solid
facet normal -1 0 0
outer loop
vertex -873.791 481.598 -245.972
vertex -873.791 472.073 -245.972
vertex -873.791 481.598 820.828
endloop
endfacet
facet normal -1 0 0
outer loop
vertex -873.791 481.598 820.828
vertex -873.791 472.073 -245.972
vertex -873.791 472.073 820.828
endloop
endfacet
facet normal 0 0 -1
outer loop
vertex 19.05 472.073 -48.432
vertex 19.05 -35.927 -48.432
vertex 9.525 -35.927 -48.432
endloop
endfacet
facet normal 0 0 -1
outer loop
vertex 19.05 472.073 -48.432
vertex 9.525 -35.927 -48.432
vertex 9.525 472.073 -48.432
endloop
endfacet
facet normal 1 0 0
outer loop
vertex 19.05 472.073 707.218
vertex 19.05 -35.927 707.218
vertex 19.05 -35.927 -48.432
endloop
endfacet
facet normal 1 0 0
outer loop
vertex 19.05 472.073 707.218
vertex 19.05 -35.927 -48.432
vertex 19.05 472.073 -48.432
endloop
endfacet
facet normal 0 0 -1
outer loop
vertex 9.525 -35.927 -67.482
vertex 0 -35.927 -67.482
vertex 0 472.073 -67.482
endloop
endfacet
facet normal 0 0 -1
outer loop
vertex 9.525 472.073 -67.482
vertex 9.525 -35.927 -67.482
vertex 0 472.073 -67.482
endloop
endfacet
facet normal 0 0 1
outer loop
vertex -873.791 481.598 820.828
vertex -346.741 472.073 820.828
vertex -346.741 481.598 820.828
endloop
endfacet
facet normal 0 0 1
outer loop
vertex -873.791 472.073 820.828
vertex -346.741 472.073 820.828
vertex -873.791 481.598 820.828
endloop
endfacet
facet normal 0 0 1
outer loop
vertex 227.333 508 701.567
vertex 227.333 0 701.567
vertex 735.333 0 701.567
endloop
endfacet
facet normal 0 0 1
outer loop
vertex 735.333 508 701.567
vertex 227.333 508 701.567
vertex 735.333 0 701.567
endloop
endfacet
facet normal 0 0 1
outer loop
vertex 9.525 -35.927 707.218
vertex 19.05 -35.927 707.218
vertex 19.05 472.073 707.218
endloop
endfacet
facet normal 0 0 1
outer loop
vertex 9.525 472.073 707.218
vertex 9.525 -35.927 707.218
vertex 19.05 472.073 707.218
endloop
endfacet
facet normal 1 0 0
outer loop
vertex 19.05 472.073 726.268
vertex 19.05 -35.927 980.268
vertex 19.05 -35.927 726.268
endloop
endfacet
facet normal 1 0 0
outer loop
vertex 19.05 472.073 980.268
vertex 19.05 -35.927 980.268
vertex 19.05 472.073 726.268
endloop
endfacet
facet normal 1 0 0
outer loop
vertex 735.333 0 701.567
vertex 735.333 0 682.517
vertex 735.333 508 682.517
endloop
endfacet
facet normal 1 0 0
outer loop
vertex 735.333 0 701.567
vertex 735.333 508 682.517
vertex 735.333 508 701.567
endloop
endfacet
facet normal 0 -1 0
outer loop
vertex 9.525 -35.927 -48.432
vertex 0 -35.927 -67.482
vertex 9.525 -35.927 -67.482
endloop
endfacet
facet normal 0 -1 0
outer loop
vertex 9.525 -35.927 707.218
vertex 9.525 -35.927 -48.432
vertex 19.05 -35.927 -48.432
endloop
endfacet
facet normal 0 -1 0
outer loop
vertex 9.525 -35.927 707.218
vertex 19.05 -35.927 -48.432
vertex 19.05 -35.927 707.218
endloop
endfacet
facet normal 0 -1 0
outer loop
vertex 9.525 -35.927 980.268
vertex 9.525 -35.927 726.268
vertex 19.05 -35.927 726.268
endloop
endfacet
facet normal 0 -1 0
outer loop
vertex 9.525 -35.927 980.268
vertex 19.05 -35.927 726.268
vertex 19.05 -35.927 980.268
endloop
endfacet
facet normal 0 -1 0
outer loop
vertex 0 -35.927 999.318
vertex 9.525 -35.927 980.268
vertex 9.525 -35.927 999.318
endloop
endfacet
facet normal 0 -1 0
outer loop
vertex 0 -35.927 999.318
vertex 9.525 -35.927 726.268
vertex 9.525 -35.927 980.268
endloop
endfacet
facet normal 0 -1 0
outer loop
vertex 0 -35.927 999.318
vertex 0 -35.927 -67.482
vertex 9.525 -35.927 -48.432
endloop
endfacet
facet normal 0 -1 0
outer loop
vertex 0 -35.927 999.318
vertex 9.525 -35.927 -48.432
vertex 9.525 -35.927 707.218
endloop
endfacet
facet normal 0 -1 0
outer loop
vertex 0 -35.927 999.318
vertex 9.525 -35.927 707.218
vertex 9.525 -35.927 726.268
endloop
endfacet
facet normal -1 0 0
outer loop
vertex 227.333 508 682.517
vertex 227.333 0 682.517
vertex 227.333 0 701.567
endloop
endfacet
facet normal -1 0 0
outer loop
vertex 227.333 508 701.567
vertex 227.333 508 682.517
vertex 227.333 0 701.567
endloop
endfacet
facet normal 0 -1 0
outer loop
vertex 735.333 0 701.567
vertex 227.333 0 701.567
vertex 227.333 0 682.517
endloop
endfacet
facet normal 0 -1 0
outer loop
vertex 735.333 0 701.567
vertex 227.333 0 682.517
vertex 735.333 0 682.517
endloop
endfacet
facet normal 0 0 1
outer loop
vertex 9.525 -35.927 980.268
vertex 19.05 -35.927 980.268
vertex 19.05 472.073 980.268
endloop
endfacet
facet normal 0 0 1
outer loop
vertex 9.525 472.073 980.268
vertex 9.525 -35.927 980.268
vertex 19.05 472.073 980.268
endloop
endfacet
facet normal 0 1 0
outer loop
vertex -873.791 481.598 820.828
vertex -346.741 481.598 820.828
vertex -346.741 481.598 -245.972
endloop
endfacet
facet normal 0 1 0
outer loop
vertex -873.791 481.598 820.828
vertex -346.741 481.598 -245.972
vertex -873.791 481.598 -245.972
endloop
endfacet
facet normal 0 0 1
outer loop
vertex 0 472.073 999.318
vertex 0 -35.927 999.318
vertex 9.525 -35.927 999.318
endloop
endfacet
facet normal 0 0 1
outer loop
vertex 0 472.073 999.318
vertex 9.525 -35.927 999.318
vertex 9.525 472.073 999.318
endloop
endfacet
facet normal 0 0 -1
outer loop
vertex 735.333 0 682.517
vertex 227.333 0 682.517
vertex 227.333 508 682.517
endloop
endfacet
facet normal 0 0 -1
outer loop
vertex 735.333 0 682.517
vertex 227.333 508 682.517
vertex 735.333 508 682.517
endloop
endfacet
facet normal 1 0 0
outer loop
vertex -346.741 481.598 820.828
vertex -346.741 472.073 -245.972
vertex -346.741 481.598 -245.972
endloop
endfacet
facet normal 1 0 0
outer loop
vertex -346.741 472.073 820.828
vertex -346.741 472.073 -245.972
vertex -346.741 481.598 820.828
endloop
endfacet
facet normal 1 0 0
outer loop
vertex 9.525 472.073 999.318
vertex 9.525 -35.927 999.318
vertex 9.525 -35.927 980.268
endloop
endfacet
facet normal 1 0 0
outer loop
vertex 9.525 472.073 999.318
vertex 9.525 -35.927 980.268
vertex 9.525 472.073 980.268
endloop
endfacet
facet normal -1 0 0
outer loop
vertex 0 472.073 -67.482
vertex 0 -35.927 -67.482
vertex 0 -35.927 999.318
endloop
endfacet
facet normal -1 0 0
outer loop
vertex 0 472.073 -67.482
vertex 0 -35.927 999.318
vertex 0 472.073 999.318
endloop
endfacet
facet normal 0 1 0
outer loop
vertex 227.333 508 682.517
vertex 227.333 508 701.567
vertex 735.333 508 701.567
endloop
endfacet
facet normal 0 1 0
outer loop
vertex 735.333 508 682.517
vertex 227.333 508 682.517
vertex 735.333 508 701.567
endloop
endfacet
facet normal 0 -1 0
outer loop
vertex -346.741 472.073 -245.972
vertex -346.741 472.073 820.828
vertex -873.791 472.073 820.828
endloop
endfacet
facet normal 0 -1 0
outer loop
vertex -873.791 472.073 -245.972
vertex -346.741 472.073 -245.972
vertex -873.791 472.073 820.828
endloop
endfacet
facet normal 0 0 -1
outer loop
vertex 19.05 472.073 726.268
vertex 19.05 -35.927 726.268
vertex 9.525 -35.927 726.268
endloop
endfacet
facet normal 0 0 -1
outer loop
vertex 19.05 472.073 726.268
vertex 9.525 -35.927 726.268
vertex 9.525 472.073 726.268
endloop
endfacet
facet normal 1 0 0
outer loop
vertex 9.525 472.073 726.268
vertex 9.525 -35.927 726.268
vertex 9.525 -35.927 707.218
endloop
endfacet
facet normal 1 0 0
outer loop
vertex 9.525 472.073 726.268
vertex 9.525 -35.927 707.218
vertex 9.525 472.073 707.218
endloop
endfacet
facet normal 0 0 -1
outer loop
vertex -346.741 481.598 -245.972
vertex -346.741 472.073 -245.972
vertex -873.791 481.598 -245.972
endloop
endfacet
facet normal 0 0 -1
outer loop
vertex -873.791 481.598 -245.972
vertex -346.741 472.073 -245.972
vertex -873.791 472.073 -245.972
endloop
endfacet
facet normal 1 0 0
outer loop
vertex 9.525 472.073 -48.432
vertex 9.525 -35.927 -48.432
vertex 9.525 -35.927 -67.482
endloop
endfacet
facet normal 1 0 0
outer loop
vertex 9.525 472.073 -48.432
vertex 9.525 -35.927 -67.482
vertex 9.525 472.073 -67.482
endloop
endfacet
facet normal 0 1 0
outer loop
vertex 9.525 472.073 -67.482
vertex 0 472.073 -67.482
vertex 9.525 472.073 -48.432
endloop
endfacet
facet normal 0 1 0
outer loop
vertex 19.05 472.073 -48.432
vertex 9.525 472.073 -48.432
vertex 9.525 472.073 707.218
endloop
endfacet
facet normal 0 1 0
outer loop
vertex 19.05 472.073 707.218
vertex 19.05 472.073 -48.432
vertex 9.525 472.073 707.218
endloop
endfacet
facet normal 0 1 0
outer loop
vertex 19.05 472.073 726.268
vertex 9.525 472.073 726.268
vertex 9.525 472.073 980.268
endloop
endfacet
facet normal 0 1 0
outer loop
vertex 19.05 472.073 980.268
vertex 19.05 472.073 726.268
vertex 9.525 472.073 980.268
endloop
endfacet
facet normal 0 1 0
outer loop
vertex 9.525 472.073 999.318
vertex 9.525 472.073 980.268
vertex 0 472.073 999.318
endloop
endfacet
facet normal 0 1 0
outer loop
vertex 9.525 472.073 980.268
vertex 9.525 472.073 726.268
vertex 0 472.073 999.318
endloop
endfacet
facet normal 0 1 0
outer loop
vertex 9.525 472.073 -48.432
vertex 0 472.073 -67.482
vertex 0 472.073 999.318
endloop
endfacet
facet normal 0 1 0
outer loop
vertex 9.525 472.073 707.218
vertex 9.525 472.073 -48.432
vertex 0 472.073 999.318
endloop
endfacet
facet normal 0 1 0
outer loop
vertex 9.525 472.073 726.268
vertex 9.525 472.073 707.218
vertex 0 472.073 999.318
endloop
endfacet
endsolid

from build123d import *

# Parameters (mm, degrees)
F0_W      = 508
F0_H      = 1066.8
F1_DEPTH  = 19.05
F2_W      = 508
F2_H      = 19.05
F3_DEPTH  = 9.525
F4_W      = 508
F4_H      = 19.05
F5_DEPTH  = 9.525
F6_W      = 508
F6_H      = 19.05
F7_DEPTH  = 9.525
F8_W      = 508
F8_H      = 19.05
F9_DEPTH  = 508
F10_W     = 527.05
F10_H     = 1066.8
F11_DEPTH = 9.525


with BuildPart() as f1:
    # F0 (on Right) → F1 (new body)
    with BuildSketch(Plane.YZ):
        with Locations((218.073032, 465.918125)):
            Rectangle(F0_W, F0_H)
    extrude(amount=F1_DEPTH)

    # F2 (on face) → F3 (cut)
    with BuildSketch(Plane.YZ.offset(19.05)):
        with Locations((218.073032, 989.793125)):
            Rectangle(F2_W, F2_H)
    extrude(amount=-F3_DEPTH, mode=Mode.SUBTRACT)

    # F4 (on face) → F5 (cut)
    with BuildSketch(Plane.YZ.offset(19.05)):
        with Locations((218.073032, -57.956875)):
            Rectangle(F4_W, F4_H)
    extrude(amount=-F5_DEPTH, mode=Mode.SUBTRACT)

    # F6 (on face) → F7 (cut)
    with BuildSketch(Plane.YZ.offset(19.05)):
        with Locations((218.073032, 716.743125)):
            Rectangle(F6_W, F6_H)
    extrude(amount=-F7_DEPTH, mode=Mode.SUBTRACT)


with BuildPart() as f9:
    # F8 (on Front) → F9 (new body)
    with BuildSketch(Plane.XZ):
        with Locations((481.333307, 692.041873)):
            Rectangle(F8_W, F8_H)
    extrude(amount=-F9_DEPTH)


with BuildPart() as f11:
    # F10 (on face) → F11 (new body)
    with BuildSketch(Plane(origin=(0, 472.073032, 0), x_dir=(-1, 0, 0), z_dir=(0, 1, 0))):
        with Locations((610.26586, 287.42832)):
            Rectangle(F10_W, F10_H)
    extrude(amount=F11_DEPTH)


solid = Compound([f1.part, f9.part, f11.part])
